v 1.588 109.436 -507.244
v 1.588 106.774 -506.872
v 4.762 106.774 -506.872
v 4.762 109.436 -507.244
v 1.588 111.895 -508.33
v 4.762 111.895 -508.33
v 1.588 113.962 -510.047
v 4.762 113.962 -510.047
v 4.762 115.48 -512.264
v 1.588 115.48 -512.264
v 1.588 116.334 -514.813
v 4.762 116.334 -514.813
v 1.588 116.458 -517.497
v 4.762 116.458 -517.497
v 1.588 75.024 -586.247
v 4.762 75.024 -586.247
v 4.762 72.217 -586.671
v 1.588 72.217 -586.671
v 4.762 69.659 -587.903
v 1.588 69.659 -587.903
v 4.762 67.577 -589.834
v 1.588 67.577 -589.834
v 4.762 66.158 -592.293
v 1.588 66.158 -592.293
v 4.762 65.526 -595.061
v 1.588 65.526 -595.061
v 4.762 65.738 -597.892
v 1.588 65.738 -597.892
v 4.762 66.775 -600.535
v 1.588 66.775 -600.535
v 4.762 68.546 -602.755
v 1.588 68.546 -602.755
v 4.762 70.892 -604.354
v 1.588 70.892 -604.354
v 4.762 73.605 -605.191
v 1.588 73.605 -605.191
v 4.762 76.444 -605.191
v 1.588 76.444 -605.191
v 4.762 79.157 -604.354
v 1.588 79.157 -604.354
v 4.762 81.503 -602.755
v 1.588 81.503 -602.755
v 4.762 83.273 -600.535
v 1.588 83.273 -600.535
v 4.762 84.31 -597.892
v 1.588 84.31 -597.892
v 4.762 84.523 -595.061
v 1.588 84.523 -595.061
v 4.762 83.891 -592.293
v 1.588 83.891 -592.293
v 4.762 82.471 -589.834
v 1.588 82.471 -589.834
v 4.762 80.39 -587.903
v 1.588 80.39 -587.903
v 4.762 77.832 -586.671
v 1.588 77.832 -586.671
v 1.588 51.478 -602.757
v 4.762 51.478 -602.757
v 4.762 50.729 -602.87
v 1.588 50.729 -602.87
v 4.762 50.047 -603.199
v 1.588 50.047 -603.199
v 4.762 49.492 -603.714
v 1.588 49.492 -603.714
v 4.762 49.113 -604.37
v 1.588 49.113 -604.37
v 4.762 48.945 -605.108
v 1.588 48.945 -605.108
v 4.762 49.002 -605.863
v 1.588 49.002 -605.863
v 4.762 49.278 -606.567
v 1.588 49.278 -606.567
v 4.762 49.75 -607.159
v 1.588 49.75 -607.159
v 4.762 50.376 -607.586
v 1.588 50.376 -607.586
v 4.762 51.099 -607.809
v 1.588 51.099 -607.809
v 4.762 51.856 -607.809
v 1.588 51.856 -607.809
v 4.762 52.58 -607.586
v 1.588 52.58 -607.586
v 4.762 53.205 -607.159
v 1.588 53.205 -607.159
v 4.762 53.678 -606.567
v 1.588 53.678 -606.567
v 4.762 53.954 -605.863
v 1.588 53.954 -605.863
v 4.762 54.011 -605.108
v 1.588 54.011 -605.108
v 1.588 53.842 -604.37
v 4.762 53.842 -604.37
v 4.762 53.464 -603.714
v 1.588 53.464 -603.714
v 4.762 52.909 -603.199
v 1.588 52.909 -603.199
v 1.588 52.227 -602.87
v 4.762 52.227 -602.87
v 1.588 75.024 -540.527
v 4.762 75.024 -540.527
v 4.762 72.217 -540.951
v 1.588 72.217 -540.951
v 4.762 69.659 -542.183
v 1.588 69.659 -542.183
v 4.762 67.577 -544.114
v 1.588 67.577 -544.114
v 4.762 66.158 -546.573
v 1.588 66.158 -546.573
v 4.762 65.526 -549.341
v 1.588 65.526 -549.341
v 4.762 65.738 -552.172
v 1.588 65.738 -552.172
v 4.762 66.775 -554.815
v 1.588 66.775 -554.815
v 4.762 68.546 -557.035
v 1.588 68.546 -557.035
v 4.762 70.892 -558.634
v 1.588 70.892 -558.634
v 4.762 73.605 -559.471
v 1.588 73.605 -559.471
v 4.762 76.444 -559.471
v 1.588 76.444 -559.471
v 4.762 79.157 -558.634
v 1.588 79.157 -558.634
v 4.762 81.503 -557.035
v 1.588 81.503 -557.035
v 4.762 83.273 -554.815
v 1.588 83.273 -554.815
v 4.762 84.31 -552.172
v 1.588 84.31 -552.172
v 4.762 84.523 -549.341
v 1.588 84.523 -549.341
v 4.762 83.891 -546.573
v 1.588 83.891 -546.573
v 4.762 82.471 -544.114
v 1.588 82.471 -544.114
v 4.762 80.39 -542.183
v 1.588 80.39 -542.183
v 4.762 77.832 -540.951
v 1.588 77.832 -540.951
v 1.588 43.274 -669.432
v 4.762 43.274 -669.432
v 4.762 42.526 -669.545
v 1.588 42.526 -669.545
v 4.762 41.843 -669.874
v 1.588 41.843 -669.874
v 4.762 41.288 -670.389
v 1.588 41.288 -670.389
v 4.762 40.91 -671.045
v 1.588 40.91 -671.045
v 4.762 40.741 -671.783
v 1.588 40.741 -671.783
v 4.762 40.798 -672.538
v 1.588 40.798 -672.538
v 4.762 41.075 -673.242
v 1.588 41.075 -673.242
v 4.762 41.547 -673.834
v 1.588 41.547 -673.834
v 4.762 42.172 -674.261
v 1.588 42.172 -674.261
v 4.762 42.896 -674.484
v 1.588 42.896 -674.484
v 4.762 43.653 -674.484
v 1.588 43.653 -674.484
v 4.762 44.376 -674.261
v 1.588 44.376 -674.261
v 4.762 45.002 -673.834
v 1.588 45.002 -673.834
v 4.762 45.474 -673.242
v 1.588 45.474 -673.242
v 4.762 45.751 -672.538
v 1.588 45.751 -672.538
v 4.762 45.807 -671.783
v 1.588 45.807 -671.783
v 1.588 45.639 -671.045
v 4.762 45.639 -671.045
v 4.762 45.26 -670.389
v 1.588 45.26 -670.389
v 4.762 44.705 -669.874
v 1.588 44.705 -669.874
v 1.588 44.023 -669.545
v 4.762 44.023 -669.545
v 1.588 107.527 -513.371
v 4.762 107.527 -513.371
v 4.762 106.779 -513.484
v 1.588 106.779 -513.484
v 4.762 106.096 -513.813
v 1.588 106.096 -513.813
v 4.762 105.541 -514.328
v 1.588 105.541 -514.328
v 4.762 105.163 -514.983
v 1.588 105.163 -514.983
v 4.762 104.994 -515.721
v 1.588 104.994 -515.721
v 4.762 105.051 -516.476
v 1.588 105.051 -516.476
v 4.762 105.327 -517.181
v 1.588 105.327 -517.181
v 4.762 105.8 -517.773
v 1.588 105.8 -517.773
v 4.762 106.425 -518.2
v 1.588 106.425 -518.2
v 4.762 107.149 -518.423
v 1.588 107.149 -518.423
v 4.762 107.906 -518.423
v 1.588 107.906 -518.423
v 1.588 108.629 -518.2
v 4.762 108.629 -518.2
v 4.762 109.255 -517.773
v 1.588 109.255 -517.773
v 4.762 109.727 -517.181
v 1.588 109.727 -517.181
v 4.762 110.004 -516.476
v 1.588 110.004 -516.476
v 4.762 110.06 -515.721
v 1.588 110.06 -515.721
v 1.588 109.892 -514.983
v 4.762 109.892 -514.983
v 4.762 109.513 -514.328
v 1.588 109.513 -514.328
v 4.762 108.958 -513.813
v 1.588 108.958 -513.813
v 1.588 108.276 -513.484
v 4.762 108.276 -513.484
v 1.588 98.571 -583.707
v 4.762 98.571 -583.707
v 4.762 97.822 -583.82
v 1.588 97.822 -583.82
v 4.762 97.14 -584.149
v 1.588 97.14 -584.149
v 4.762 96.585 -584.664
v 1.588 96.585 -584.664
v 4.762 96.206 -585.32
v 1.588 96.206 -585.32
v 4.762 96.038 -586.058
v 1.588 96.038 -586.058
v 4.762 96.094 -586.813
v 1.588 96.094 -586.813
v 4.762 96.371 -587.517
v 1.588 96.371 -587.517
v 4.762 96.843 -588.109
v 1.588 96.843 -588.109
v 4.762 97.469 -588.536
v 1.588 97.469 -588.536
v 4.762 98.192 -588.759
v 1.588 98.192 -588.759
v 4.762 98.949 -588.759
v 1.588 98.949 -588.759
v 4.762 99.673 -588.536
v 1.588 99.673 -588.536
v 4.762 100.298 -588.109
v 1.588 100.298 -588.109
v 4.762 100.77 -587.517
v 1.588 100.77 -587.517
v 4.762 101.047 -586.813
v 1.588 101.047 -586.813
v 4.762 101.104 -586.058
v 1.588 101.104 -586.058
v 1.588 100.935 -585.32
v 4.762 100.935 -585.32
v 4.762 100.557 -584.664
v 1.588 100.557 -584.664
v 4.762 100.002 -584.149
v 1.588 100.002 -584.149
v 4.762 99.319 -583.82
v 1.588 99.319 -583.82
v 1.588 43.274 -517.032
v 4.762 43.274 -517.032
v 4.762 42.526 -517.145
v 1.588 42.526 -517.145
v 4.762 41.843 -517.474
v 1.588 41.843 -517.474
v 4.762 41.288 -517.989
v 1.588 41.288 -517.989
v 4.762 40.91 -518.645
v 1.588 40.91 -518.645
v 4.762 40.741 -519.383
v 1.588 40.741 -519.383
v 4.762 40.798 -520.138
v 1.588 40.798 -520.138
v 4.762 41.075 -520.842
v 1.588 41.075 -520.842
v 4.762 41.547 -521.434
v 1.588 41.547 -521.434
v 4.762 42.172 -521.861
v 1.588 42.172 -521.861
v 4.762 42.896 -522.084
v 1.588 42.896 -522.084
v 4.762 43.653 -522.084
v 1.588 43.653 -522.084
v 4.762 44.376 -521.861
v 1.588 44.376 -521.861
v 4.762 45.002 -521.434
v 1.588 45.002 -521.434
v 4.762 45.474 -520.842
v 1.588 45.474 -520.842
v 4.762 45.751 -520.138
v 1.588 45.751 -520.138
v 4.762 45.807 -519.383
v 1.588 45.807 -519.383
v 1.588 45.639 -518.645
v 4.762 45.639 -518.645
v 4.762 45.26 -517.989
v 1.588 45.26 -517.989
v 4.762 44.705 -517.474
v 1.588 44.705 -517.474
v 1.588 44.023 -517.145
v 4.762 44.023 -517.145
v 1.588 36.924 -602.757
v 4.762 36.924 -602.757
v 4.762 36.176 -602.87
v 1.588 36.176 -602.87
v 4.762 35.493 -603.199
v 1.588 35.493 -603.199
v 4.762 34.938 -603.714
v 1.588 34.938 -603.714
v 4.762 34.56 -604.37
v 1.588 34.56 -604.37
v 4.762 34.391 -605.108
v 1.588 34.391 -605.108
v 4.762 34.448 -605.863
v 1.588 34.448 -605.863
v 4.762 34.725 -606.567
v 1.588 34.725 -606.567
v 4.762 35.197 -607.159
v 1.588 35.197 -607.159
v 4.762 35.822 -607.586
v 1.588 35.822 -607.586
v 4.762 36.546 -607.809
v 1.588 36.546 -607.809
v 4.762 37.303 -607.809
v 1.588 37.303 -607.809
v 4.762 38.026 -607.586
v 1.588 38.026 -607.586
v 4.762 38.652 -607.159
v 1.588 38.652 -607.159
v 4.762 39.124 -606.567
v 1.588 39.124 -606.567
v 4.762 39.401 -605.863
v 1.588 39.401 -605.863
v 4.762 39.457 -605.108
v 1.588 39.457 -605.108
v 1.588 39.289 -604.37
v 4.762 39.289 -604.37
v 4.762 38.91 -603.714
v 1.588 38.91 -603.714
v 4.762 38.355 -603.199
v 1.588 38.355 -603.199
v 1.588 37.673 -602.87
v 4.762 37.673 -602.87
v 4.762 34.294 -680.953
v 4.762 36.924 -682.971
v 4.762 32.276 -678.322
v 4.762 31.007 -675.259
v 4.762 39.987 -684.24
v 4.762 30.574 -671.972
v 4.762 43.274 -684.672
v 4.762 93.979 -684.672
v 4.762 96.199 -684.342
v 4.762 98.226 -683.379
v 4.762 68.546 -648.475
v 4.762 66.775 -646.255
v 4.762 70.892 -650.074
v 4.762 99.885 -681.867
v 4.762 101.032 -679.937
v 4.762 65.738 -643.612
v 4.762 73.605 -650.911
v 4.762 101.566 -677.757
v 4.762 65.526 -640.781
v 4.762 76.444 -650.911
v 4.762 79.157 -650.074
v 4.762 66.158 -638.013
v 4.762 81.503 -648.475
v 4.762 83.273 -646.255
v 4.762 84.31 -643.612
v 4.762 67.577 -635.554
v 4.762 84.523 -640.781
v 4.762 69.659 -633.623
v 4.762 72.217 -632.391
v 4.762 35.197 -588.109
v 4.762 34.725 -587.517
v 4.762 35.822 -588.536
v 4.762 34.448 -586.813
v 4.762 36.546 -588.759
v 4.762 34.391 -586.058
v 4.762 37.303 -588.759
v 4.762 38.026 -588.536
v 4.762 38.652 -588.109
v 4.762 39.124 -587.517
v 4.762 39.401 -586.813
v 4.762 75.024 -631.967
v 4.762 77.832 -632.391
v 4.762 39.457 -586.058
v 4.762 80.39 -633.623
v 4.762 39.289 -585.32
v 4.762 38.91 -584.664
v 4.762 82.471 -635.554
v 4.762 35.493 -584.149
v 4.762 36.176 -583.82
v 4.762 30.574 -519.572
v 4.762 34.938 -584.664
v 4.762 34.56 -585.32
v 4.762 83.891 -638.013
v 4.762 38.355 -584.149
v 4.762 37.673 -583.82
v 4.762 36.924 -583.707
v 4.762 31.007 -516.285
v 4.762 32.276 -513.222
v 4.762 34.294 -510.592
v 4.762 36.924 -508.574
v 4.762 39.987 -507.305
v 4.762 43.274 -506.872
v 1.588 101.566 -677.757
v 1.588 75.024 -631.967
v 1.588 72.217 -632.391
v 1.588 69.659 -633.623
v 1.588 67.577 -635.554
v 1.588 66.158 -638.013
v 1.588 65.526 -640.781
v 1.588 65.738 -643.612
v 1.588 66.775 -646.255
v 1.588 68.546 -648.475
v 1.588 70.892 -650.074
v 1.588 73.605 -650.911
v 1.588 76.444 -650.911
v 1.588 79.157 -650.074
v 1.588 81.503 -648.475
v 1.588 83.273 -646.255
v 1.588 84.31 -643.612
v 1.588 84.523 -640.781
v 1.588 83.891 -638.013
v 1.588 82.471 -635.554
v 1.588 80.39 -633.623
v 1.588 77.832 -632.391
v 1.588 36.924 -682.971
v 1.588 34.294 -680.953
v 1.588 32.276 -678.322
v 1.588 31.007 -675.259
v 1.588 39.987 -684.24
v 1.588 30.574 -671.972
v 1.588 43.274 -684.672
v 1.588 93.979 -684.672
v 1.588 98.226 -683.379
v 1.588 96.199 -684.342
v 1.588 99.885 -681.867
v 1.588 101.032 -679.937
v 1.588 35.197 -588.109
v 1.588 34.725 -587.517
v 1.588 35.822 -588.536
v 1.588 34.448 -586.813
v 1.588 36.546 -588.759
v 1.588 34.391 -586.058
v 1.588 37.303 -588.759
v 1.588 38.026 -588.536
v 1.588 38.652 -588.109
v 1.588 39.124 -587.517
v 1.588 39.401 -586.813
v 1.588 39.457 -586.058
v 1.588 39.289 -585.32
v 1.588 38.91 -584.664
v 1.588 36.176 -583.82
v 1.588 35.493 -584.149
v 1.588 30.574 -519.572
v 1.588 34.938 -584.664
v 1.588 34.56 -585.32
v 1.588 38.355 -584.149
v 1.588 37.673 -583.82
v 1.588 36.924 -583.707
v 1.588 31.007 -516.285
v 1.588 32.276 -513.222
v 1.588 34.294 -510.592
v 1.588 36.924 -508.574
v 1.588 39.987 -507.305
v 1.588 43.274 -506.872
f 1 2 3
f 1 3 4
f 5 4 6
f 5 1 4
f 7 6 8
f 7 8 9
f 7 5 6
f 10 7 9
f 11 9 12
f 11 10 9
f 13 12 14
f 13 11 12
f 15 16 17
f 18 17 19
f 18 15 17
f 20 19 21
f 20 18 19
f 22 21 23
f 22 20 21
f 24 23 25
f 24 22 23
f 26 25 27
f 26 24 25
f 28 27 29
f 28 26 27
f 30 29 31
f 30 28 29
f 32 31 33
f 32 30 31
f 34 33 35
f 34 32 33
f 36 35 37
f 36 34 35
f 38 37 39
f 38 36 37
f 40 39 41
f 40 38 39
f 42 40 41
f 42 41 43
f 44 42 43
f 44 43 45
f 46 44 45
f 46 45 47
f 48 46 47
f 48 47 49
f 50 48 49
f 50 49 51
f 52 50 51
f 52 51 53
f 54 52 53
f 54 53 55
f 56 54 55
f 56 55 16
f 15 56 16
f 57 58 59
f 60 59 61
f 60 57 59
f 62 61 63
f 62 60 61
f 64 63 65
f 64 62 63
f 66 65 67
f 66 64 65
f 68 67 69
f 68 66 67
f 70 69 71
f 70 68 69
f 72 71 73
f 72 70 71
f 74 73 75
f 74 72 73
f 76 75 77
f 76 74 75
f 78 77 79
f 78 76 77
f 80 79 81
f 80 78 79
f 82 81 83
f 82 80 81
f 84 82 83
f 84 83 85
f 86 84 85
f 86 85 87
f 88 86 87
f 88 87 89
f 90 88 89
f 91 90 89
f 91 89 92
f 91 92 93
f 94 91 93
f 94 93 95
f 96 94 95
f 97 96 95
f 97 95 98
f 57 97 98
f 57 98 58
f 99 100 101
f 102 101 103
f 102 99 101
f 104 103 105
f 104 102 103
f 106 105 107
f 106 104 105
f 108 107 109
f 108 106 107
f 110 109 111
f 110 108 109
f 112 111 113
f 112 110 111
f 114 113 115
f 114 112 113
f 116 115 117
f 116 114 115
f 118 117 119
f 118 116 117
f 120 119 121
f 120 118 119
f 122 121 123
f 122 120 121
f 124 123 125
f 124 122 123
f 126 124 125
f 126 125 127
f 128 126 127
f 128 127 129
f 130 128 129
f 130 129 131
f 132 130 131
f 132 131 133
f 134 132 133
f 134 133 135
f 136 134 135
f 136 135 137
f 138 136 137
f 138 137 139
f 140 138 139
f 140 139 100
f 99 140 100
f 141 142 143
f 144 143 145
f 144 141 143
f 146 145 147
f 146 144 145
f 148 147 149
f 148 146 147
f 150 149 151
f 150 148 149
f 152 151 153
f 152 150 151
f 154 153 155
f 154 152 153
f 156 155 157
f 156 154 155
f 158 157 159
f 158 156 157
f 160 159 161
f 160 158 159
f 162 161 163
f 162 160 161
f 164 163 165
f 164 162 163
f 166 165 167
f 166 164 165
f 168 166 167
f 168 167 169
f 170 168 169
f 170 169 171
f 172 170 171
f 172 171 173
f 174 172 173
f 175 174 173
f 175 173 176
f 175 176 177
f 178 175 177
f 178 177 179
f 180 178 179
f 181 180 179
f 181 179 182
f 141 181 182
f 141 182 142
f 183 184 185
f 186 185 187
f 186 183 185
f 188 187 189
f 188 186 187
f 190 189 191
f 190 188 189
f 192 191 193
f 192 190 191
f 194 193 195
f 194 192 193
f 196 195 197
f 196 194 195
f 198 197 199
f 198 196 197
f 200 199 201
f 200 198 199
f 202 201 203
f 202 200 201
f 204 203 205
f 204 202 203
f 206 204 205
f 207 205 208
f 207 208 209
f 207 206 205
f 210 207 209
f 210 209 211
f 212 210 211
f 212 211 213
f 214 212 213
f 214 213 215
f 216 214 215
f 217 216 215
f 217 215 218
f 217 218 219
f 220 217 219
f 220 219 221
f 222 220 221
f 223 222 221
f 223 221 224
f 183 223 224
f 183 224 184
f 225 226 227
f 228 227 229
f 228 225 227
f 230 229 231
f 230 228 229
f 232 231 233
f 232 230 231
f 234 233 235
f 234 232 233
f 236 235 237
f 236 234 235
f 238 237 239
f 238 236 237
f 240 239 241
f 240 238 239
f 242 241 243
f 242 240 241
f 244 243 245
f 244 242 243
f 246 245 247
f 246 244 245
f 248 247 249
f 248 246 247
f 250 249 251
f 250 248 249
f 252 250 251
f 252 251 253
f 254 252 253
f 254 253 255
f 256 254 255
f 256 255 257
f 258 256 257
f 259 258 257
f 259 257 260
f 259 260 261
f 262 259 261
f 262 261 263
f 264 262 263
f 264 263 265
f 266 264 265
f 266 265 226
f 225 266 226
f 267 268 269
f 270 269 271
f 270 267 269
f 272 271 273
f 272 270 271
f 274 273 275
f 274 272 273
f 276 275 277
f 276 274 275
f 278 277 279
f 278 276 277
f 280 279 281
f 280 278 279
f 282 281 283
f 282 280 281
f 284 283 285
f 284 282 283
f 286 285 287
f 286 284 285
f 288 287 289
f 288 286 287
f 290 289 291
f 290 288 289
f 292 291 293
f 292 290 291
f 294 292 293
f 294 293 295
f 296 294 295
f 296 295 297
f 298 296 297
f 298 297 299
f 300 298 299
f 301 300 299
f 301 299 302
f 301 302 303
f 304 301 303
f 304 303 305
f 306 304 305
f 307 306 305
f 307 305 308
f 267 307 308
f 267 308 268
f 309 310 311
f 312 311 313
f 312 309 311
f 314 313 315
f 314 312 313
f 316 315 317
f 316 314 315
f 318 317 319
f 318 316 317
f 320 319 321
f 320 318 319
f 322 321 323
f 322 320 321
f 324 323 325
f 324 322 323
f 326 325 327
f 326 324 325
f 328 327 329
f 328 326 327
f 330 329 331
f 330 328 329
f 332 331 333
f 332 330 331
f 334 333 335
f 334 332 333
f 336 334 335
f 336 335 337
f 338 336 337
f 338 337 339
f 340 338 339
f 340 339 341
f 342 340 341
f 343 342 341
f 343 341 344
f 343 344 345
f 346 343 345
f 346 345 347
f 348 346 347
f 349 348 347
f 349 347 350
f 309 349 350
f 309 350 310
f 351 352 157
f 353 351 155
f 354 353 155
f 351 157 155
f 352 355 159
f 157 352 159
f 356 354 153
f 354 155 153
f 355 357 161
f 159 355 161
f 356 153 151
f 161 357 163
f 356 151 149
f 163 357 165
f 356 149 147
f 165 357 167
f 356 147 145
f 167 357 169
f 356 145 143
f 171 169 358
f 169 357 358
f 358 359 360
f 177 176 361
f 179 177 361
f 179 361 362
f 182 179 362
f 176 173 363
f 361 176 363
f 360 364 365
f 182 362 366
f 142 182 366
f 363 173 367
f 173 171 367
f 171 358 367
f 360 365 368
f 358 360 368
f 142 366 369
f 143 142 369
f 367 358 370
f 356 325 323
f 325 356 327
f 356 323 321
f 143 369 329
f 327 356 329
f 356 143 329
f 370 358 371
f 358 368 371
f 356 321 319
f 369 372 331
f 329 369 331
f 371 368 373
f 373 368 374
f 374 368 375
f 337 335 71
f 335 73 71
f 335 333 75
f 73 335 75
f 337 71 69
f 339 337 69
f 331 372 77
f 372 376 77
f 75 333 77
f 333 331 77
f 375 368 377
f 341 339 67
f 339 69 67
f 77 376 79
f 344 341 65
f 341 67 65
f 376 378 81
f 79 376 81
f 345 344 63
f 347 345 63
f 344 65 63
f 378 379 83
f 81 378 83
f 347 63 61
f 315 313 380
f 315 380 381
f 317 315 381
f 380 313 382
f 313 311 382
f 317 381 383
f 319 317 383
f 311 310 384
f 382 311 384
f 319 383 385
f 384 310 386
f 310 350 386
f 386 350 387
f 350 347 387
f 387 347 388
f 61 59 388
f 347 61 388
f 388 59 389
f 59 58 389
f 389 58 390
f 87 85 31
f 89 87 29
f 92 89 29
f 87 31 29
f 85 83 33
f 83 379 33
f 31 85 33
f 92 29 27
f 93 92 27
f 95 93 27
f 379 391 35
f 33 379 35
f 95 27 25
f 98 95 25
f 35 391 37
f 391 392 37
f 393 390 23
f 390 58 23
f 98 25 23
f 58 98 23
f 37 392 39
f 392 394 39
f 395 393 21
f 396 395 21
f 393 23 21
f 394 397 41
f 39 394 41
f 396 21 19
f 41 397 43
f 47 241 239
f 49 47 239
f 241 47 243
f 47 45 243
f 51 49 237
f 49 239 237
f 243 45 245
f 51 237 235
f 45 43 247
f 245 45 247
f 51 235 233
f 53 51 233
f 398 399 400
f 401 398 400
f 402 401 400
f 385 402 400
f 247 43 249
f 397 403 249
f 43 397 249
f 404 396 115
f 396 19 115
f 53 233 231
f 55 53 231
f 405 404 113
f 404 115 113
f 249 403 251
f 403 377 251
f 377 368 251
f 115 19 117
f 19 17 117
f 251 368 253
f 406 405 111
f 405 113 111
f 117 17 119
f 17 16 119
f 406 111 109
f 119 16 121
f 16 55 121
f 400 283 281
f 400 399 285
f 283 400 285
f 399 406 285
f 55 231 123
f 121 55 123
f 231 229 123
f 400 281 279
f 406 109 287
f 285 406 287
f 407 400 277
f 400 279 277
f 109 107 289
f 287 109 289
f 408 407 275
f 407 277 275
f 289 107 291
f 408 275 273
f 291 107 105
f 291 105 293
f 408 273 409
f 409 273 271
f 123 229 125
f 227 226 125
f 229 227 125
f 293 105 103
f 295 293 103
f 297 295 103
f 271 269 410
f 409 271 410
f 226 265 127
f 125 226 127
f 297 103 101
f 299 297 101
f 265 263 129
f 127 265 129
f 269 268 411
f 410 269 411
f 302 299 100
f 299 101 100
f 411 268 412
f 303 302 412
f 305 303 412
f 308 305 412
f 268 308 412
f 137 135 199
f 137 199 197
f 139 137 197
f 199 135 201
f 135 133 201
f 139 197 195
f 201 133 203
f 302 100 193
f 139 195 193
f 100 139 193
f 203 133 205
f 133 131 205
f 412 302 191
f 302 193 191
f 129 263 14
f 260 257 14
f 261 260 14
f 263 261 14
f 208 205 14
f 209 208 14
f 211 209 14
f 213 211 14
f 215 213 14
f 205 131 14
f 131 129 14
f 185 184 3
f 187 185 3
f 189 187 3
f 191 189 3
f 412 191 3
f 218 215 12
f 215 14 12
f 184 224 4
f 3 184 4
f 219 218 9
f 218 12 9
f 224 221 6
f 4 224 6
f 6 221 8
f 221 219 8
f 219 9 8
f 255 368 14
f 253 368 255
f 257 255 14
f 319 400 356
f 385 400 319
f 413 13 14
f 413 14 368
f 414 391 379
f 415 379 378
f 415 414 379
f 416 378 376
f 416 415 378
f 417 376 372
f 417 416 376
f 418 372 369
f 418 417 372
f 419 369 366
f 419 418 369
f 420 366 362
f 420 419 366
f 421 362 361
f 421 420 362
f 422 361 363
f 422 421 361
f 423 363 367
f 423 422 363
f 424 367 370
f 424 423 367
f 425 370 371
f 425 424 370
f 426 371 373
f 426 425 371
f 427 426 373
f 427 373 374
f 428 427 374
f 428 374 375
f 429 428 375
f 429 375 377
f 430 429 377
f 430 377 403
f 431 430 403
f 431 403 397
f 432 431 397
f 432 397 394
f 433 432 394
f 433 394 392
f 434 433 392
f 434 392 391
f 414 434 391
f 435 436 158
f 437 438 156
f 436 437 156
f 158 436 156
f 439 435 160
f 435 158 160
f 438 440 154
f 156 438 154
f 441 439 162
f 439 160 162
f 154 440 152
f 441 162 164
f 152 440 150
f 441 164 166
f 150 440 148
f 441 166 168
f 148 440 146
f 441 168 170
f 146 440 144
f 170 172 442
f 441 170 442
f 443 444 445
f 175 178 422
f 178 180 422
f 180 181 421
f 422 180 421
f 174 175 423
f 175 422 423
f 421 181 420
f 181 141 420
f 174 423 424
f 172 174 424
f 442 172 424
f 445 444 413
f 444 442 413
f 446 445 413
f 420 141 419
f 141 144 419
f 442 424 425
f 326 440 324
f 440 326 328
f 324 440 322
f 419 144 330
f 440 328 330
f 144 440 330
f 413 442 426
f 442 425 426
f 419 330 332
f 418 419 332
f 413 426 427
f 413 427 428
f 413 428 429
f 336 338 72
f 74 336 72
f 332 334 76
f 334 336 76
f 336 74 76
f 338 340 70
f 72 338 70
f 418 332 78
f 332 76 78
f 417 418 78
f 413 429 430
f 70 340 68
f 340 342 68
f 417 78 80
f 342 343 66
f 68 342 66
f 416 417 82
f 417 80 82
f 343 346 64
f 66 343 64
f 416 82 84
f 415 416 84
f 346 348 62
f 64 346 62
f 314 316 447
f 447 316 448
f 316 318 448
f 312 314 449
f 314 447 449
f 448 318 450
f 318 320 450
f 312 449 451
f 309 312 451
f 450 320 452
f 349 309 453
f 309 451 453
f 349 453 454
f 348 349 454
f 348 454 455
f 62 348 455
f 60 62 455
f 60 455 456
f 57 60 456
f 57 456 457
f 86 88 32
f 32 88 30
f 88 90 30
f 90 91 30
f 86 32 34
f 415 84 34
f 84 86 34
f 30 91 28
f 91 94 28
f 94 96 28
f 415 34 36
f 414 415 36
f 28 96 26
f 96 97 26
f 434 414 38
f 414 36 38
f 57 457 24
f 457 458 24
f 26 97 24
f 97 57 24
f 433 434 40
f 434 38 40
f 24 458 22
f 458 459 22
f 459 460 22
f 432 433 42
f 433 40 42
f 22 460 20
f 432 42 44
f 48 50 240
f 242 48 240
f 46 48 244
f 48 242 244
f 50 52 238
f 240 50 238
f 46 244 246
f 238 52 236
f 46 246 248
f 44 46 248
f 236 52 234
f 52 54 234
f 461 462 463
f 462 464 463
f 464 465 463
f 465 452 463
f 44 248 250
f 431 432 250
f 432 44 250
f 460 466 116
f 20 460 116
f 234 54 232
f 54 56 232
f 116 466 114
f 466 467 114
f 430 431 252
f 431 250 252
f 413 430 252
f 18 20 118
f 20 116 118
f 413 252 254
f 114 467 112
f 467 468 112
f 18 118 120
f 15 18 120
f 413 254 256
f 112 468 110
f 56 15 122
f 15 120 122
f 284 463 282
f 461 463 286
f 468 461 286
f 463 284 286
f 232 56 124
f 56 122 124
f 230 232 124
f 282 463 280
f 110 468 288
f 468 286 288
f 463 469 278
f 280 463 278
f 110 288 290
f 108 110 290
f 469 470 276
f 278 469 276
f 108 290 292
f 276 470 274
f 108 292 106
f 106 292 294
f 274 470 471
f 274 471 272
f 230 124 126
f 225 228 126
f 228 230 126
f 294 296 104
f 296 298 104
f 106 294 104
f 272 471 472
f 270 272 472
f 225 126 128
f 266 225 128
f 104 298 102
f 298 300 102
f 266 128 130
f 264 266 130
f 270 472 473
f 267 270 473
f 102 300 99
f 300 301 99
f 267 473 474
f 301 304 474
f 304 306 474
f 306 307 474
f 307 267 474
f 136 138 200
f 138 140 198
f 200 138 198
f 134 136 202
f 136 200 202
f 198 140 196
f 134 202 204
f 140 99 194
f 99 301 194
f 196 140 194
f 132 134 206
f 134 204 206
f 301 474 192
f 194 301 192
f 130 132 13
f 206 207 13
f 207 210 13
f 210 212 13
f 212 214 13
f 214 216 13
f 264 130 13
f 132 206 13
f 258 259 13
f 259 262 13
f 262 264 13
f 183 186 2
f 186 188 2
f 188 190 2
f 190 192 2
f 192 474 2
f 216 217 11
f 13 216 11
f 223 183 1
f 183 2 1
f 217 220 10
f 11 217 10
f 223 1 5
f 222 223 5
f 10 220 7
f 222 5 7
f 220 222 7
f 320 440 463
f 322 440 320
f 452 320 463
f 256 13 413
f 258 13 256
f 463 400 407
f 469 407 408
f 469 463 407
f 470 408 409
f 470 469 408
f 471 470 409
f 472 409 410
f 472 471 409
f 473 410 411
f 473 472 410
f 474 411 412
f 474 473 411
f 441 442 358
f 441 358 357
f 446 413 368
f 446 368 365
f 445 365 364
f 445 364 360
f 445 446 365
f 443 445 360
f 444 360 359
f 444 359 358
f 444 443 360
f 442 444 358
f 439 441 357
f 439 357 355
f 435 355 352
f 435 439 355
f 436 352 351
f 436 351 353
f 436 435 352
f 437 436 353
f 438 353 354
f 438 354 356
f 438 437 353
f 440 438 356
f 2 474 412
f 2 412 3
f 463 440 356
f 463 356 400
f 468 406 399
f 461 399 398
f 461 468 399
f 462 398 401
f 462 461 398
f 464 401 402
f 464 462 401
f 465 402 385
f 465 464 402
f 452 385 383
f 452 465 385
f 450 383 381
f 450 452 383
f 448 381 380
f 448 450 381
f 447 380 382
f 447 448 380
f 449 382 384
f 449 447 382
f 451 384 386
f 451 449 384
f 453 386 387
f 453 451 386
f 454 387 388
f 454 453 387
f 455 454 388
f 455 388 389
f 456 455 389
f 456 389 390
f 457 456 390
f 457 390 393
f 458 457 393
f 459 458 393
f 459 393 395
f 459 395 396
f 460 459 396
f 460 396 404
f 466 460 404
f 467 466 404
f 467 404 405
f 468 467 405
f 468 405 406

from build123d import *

# Parameters (mm, degrees)
SKETCH1_R                  = 2.54
SKETCH1_R_2                = 9.525
BOSS_EXTRUDE1_DEPTH        = 4.7625
CONVERT_SOLID1_OUTLINE_R   = 2.54
CONVERT_SOLID1_OUTLINE_R_2 = 9.525
CONVERT_SOLID1_DEPTH       = 1.5875


# Read off the part's stored shape, not the designer's step: Convert-Solid1
with BuildPart() as part:
    # Sketch1 → Boss-Extrude1 (new body)
    with BuildSketch(Plane(origin=(0, 0, 0), x_dir=(0, 0, -1), z_dir=(1, 0, 0))):
        with BuildLine():
            Line((517.497208961, 116.457539853), (677.757490375, 101.56617639))
            ThreePointArc((677.757490375, 101.56617639), (682.684377991, 99.111706327), (684.672478048, 93.978860817))
            Line((684.672478048, 93.978860817), (684.672478048, 43.274288567))
            ThreePointArc((684.672478048, 43.274288567), (680.952734169, 34.294032445), (671.972478048, 30.574288567))
            Line((671.972478048, 30.574288567), (519.572478048, 30.574288567))
            ThreePointArc((519.572478048, 30.574288567), (510.592221927, 34.294032445), (506.872478048, 43.274288567))
            Line((506.872478048, 43.274288567), (506.872478048, 106.774288567))
            ThreePointArc((506.872478048, 106.774288567), (510.046689227, 113.961956173), (517.497208961, 116.457539853))
        make_face()
        with Locations(Location((515.911244675, 107.527203865, 0), (0, 0, 180))):
            Circle(SKETCH1_R, mode=Mode.SUBTRACT)
        with Locations(Location((550.052478048, 75.024288567, 0), (0, 0, 180))):
            Circle(SKETCH1_R_2, mode=Mode.SUBTRACT)
        with Locations(Location((595.772478048, 75.024288567, 0), (0, 0, 180))):
            Circle(SKETCH1_R_2, mode=Mode.SUBTRACT)
        with Locations(Location((605.297478048, 51.47785837, 0), (0, 0, 180))):
            Circle(SKETCH1_R, mode=Mode.SUBTRACT)
        with Locations(Location((586.247478048, 98.570718763, 0), (0, 0, 180))):
            Circle(SKETCH1_R, mode=Mode.SUBTRACT)
        with Locations(Location((641.492478048, 75.024288567, 0), (0, 0, 180))):
            Circle(SKETCH1_R_2, mode=Mode.SUBTRACT)
        with Locations(Location((605.297478048, 36.924288567, 0), (0, 0, 180))):
            Circle(SKETCH1_R, mode=Mode.SUBTRACT)
        with Locations(Location((586.247478048, 36.924288567, 0), (0, 0, 180))):
            Circle(SKETCH1_R, mode=Mode.SUBTRACT)
        with Locations(Location((519.572478048, 43.274288567, 0), (0, 0, 180))):
            Circle(SKETCH1_R, mode=Mode.SUBTRACT)
        with Locations(Location((671.972478048, 43.274288567, 0), (0, 0, 180))):
            Circle(SKETCH1_R, mode=Mode.SUBTRACT)
    extrude(amount=BOSS_EXTRUDE1_DEPTH)

    # Convert-Solid1 outline → Convert-Solid1 (cut)
    with BuildSketch(Plane.YZ):
        with BuildLine():
            ThreePointArc((116.457539853, -517.497208961), (113.961956173, -510.046689227), (106.774288567, -506.872478048))
            Line((106.774288567, -506.872478048), (43.274288567, -506.872478048))
            ThreePointArc((43.274288567, -506.872478048), (34.294032446, -510.592221927), (30.574288567, -519.572478048))
            Line((30.574288567, -519.572478048), (30.574288567, -671.972478048))
            ThreePointArc((30.574288567, -671.972478048), (34.294032445, -680.952734169), (43.274288567, -684.672478048))
            Line((43.274288567, -684.672478048), (93.978860817, -684.672478048))
            ThreePointArc((93.978860817, -684.672478048), (99.111706327, -682.684377991), (101.56617639, -677.757490375))
            Line((101.56617639, -677.757490375), (116.457539853, -517.497208961))
        make_face()
        with Locations((43.274288567, -671.972478048)):
            Circle(CONVERT_SOLID1_OUTLINE_R, mode=Mode.SUBTRACT)
        with Locations((36.924288567, -605.297478048)):
            Circle(CONVERT_SOLID1_OUTLINE_R, mode=Mode.SUBTRACT)
        with Locations((51.47785837, -605.297478048)):
            Circle(CONVERT_SOLID1_OUTLINE_R, mode=Mode.SUBTRACT)
        with Locations((75.024288567, -641.492478048)):
            Circle(CONVERT_SOLID1_OUTLINE_R_2, mode=Mode.SUBTRACT)
        with Locations((75.024288567, -595.772478048)):
            Circle(CONVERT_SOLID1_OUTLINE_R_2, mode=Mode.SUBTRACT)
        with Locations((36.924288567, -586.247478048)):
            Circle(CONVERT_SOLID1_OUTLINE_R, mode=Mode.SUBTRACT)
        with Locations((43.274288567, -519.572478048)):
            Circle(CONVERT_SOLID1_OUTLINE_R, mode=Mode.SUBTRACT)
        with Locations((98.570718763, -586.247478048)):
            Circle(CONVERT_SOLID1_OUTLINE_R, mode=Mode.SUBTRACT)
        with Locations((75.024288567, -550.052478048)):
            Circle(CONVERT_SOLID1_OUTLINE_R_2, mode=Mode.SUBTRACT)
        with Locations((107.527203865, -515.911244675)):
            Circle(CONVERT_SOLID1_OUTLINE_R, mode=Mode.SUBTRACT)
    extrude(amount=CONVERT_SOLID1_DEPTH, mode=Mode.SUBTRACT)


solid = part.part
